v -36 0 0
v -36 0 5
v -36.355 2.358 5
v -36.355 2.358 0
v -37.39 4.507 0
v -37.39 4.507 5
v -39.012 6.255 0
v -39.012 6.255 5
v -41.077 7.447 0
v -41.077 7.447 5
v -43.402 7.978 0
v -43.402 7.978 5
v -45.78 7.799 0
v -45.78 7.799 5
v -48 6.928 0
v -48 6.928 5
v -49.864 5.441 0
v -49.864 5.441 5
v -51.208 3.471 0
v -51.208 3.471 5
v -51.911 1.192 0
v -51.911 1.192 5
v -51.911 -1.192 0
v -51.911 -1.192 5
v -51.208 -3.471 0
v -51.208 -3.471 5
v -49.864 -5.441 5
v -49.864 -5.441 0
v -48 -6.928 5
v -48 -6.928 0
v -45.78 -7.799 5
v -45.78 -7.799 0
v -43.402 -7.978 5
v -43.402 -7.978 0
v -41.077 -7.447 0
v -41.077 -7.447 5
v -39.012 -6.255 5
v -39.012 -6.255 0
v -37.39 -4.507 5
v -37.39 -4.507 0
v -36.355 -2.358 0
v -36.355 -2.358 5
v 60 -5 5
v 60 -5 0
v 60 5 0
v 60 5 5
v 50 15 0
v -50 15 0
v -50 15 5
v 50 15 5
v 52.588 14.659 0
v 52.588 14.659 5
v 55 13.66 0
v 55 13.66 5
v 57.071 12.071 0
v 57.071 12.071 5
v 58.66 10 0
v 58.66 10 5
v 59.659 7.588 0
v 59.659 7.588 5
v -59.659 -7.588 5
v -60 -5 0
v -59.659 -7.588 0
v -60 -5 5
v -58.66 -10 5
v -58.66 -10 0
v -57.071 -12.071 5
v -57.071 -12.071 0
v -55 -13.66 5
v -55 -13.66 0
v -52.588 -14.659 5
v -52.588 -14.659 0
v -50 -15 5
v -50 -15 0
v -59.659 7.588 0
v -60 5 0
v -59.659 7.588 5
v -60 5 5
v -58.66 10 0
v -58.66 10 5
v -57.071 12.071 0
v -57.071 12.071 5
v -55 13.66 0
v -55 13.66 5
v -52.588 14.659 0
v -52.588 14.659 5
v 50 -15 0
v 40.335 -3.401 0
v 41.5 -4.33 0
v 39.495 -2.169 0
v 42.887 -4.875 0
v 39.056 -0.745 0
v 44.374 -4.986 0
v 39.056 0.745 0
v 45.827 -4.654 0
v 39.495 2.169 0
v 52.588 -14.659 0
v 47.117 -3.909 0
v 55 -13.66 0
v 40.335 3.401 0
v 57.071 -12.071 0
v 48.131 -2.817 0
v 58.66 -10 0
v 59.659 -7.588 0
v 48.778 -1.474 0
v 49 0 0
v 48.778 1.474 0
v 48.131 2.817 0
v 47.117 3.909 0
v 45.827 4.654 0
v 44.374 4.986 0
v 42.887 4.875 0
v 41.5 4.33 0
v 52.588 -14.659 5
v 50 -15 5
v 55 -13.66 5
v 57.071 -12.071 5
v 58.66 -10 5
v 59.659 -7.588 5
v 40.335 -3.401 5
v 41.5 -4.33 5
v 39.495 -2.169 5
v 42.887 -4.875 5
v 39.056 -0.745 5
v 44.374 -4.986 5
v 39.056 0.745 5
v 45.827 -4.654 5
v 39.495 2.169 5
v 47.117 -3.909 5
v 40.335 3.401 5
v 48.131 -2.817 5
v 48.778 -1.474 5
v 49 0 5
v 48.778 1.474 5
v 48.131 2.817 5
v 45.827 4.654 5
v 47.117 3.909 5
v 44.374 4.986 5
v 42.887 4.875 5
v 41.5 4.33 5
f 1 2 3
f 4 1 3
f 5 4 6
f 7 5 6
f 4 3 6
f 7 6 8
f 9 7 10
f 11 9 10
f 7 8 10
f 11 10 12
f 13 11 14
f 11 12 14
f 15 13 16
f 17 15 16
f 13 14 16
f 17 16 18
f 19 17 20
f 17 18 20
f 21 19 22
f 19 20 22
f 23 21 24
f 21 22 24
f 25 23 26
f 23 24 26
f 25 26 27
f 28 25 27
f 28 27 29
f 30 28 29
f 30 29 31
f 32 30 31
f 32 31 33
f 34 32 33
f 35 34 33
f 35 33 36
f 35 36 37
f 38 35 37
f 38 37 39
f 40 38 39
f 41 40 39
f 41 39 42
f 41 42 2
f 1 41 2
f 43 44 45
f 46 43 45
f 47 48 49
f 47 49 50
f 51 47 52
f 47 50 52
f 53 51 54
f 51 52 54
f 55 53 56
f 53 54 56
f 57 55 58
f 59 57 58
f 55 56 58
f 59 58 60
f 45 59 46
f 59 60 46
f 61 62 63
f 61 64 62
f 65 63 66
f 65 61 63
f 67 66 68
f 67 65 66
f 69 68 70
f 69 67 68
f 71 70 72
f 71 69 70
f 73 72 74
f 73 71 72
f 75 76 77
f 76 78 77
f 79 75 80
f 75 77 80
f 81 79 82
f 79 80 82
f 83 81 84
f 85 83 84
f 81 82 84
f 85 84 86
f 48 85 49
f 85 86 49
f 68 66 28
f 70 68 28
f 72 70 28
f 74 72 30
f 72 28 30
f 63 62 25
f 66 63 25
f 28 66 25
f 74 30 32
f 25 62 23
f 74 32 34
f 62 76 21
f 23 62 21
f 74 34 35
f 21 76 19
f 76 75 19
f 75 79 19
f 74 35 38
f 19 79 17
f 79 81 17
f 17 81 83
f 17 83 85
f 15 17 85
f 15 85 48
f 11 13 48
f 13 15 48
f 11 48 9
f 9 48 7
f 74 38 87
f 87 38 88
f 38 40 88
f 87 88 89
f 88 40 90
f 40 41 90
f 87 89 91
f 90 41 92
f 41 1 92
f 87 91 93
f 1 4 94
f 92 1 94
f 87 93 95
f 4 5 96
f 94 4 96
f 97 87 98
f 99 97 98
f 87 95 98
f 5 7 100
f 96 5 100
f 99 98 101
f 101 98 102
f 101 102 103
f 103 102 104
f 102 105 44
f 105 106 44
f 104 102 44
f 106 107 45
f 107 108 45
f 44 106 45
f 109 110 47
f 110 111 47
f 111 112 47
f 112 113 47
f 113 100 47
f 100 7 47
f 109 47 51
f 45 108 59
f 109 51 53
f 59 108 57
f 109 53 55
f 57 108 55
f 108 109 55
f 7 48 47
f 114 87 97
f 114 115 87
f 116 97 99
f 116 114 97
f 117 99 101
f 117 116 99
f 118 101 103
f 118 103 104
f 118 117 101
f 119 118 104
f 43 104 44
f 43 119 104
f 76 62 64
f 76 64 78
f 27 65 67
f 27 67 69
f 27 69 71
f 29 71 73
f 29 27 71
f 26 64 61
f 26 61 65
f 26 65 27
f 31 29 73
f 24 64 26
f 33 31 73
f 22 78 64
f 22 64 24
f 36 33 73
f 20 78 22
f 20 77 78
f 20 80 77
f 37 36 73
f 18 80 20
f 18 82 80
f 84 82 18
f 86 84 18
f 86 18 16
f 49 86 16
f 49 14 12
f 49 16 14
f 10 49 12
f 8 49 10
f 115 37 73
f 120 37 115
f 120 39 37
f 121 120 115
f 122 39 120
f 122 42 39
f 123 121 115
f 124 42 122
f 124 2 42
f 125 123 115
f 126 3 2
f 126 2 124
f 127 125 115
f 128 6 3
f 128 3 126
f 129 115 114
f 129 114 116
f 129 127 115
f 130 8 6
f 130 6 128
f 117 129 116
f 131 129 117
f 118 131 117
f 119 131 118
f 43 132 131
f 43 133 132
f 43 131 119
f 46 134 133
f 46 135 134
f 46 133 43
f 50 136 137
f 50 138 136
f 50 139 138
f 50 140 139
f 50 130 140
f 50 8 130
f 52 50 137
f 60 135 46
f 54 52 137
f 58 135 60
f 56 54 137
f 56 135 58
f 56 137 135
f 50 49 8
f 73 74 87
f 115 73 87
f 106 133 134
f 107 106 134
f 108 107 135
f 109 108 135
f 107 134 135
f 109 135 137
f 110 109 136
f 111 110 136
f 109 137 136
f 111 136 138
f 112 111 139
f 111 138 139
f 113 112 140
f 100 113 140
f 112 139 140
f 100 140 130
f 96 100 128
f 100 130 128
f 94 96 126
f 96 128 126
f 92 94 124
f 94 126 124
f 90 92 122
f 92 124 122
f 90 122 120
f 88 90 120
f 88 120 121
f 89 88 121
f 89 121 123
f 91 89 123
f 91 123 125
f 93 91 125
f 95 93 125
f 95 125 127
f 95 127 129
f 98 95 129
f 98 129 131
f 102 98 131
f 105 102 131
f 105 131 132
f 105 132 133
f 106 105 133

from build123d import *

# Parameters (mm, degrees)
ESQUISSE1_W             = 120
ESQUISSE1_H             = 30
BOSS_EXTRU_1_DEPTH      = 5
ESQUISSE2_R             = 8
ESQUISSE2_R_2           = 5
ENL_V_MAT_EXTRU_1_DEPTH = 10
CONG_1_R                = 10


with BuildPart() as part:
    # Esquisse1 → Boss.-Extru.1 (new body)
    with BuildSketch(Plane.XY):
        Rectangle(ESQUISSE1_W, ESQUISSE1_H)
    extrude(amount=BOSS_EXTRU_1_DEPTH)

    # Esquisse2 → Enlèv. mat.-Extru.1 (cut)
    with BuildSketch(Plane.XY.offset(5)):
        with Locations((-44, 0)):
            Circle(ESQUISSE2_R)
        with Locations((44, 0)):
            Circle(ESQUISSE2_R_2)
    extrude(amount=-ENL_V_MAT_EXTRU_1_DEPTH, mode=Mode.SUBTRACT)

    # Congé1
    cong_1_edges = [part.edges().sort_by_distance(p)[0] for p in [
        (-60, 15, 2.5),
        (60, 15, 2.5),
        (60, -15, 2.5),
        (-60, -15, 2.5),
    ]]
    fillet(cong_1_edges, radius=CONG_1_R)


solid = part.part
